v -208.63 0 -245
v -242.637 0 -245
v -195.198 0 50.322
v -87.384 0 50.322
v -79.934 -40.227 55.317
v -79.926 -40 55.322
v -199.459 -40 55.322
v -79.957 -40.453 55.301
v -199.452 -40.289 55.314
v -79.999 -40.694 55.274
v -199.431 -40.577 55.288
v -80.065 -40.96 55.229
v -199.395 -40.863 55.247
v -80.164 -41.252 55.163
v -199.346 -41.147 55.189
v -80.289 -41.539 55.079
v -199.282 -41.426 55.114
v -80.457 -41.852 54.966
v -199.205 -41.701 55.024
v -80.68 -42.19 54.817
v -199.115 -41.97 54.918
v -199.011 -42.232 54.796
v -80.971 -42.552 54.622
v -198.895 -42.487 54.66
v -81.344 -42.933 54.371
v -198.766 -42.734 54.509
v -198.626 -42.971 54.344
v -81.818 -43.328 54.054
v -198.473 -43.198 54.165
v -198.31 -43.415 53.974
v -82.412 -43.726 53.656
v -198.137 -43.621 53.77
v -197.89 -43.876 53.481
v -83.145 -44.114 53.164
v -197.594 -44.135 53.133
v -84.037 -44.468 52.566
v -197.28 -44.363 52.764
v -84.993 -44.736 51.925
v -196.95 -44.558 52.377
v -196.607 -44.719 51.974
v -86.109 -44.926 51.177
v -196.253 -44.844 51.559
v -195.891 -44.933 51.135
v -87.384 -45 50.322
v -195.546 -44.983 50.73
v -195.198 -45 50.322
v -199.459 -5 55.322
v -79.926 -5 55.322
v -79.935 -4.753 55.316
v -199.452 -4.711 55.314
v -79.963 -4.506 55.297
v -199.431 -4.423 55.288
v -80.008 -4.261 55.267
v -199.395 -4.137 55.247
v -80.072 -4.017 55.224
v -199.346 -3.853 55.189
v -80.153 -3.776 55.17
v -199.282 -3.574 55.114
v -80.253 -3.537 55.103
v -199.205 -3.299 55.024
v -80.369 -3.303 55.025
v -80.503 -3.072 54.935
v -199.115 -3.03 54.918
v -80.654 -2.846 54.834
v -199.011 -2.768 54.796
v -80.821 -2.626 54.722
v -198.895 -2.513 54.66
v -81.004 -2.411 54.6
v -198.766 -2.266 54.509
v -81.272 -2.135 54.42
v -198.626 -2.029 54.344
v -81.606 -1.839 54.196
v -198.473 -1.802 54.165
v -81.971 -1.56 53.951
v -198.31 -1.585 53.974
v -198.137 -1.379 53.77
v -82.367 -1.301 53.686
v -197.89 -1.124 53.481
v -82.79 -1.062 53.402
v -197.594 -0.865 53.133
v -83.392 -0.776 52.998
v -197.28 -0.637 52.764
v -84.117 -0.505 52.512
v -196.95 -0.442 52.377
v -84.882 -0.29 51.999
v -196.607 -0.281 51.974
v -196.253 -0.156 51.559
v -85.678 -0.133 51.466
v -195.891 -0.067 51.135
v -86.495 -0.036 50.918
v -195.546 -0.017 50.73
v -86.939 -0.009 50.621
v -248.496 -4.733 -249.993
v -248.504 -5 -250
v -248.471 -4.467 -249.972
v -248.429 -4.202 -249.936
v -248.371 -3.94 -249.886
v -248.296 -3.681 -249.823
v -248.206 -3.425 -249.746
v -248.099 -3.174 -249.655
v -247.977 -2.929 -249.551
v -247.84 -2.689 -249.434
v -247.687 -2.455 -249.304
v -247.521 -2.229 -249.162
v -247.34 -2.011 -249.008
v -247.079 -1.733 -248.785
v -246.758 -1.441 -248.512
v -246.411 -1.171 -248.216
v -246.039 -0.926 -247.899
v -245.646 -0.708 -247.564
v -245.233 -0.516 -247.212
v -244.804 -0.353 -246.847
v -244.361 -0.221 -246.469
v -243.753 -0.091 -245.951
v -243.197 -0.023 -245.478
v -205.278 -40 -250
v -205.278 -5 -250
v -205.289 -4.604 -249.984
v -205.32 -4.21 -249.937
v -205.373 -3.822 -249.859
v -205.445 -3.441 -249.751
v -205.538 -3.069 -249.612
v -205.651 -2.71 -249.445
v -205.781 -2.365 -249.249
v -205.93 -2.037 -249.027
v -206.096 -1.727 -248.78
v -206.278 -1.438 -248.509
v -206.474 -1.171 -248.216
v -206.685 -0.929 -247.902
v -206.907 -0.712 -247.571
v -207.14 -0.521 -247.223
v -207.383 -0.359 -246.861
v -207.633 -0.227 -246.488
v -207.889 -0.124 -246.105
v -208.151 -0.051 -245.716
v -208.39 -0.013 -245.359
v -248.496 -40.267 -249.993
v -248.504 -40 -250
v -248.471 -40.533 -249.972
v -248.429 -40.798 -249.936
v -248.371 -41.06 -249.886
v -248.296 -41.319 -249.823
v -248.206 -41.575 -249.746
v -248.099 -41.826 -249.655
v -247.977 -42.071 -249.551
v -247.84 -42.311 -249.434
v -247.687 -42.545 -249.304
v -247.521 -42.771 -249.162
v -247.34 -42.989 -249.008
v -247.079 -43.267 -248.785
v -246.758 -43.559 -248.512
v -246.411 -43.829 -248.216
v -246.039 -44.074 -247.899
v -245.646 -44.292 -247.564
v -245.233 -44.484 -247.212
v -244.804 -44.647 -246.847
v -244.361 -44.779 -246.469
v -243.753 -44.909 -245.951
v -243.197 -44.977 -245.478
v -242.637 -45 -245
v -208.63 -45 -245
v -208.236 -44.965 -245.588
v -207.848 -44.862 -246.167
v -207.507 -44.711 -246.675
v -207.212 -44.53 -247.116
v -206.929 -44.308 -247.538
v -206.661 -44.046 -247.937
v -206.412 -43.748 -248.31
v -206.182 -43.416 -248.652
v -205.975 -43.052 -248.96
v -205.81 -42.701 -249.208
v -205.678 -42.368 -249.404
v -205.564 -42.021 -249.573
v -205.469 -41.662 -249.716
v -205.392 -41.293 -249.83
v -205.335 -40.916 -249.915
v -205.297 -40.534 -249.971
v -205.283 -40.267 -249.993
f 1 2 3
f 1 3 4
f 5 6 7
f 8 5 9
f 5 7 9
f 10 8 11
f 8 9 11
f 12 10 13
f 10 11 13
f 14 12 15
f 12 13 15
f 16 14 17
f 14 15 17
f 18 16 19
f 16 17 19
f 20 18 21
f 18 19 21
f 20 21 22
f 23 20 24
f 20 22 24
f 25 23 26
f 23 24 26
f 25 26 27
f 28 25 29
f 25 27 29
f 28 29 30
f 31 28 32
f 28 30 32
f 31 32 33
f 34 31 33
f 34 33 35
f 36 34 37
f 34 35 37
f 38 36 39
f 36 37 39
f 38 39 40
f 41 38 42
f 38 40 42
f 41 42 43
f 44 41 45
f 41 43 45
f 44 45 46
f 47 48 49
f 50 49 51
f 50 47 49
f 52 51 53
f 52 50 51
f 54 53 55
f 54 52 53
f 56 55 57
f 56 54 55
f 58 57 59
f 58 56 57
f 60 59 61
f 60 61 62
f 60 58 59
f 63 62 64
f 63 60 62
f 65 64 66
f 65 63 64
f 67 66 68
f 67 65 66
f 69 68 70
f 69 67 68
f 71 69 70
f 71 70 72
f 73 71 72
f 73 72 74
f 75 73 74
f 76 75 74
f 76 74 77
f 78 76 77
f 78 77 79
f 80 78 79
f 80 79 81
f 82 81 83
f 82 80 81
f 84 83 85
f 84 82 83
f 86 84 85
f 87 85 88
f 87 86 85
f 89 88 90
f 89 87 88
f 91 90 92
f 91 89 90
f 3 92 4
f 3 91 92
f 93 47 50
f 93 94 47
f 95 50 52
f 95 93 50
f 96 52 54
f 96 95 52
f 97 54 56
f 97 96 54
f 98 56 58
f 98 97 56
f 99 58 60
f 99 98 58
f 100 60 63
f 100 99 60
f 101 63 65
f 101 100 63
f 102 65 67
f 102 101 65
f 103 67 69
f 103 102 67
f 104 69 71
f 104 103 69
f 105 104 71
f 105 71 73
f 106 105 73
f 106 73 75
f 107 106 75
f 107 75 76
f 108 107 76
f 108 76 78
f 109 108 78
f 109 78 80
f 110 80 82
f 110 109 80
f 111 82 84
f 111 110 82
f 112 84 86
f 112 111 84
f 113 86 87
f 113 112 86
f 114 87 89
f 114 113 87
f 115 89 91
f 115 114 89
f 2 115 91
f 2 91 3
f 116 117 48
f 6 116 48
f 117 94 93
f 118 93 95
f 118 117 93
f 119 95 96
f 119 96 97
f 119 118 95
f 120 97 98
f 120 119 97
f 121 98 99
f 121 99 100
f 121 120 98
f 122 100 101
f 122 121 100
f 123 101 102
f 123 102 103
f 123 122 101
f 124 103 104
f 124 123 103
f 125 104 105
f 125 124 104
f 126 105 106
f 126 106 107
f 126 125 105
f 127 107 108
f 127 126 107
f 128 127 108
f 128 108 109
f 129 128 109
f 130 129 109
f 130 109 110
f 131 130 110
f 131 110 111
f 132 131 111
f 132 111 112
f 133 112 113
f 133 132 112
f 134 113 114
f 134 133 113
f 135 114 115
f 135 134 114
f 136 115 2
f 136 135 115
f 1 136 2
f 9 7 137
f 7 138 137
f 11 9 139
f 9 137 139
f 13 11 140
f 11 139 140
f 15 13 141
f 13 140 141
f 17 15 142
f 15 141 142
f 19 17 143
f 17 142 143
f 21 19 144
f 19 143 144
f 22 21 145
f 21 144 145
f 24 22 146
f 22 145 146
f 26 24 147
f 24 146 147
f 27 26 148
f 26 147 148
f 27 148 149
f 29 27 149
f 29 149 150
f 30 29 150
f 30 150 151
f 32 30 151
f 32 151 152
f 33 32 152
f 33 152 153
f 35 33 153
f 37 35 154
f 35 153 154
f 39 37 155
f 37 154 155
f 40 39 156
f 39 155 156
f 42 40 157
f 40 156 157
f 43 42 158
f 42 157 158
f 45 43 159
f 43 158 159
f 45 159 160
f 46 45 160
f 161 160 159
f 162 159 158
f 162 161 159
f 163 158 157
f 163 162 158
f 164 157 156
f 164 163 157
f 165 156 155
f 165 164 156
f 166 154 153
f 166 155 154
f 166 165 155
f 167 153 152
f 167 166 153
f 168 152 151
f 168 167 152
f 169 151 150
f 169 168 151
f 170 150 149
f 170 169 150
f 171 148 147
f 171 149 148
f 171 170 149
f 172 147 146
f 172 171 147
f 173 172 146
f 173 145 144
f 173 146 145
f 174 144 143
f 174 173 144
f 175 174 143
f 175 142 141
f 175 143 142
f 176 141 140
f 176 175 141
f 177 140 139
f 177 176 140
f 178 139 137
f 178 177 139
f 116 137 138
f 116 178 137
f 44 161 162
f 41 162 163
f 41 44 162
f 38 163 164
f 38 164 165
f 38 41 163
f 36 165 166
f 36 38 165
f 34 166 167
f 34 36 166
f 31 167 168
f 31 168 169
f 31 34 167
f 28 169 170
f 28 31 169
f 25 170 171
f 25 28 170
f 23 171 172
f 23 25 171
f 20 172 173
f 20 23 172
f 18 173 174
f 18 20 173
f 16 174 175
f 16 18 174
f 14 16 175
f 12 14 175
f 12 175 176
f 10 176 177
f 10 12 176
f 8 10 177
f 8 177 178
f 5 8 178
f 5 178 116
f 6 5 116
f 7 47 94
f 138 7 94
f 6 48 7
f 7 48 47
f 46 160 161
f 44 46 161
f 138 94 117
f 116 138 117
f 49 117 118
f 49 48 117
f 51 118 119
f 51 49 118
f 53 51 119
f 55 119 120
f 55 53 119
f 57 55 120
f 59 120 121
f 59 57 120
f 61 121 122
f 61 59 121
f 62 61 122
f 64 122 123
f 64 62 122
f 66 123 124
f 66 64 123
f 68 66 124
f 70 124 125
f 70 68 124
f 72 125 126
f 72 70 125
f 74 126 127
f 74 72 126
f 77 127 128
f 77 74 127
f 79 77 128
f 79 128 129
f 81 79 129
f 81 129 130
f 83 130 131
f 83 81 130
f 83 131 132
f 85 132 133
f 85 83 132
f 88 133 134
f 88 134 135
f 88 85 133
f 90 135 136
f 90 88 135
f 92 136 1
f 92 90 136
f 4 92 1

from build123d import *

# Parameters (mm, degrees)
F1_DEPTH = 45
F2_R     = 5
F3_R     = 5


with BuildPart() as f1:
    # F0 (on Front) → F1 (new body)
    with BuildSketch(Plane.XZ):
        Polygon((-199.459287, 55.321917), (-248.504069, -250), (-205.278272, -250), (-79.926361, 55.321917), align=None)
    extrude(amount=F1_DEPTH)

    # F2
    f2_edges = [f1.edges().sort_by_distance(p)[0] for p in [
        (-223.981678, 0, -97.339041),
        (-226.891171, 0, -250),
        (-142.602317, 0, -97.339041),
        (-139.692824, 0, 55.321917),
    ]]
    fillet(f2_edges, radius=F2_R)

    # F3
    f3_edges = [f1.edges().sort_by_distance(p)[0] for p in [
        (-223.981678, -45, -97.339041),
        (-226.891171, -45, -250),
        (-142.602317, -45, -97.339041),
        (-139.692824, -45, 55.321917),
    ]]
    fillet(f3_edges, radius=F3_R)


solid = f1.part
